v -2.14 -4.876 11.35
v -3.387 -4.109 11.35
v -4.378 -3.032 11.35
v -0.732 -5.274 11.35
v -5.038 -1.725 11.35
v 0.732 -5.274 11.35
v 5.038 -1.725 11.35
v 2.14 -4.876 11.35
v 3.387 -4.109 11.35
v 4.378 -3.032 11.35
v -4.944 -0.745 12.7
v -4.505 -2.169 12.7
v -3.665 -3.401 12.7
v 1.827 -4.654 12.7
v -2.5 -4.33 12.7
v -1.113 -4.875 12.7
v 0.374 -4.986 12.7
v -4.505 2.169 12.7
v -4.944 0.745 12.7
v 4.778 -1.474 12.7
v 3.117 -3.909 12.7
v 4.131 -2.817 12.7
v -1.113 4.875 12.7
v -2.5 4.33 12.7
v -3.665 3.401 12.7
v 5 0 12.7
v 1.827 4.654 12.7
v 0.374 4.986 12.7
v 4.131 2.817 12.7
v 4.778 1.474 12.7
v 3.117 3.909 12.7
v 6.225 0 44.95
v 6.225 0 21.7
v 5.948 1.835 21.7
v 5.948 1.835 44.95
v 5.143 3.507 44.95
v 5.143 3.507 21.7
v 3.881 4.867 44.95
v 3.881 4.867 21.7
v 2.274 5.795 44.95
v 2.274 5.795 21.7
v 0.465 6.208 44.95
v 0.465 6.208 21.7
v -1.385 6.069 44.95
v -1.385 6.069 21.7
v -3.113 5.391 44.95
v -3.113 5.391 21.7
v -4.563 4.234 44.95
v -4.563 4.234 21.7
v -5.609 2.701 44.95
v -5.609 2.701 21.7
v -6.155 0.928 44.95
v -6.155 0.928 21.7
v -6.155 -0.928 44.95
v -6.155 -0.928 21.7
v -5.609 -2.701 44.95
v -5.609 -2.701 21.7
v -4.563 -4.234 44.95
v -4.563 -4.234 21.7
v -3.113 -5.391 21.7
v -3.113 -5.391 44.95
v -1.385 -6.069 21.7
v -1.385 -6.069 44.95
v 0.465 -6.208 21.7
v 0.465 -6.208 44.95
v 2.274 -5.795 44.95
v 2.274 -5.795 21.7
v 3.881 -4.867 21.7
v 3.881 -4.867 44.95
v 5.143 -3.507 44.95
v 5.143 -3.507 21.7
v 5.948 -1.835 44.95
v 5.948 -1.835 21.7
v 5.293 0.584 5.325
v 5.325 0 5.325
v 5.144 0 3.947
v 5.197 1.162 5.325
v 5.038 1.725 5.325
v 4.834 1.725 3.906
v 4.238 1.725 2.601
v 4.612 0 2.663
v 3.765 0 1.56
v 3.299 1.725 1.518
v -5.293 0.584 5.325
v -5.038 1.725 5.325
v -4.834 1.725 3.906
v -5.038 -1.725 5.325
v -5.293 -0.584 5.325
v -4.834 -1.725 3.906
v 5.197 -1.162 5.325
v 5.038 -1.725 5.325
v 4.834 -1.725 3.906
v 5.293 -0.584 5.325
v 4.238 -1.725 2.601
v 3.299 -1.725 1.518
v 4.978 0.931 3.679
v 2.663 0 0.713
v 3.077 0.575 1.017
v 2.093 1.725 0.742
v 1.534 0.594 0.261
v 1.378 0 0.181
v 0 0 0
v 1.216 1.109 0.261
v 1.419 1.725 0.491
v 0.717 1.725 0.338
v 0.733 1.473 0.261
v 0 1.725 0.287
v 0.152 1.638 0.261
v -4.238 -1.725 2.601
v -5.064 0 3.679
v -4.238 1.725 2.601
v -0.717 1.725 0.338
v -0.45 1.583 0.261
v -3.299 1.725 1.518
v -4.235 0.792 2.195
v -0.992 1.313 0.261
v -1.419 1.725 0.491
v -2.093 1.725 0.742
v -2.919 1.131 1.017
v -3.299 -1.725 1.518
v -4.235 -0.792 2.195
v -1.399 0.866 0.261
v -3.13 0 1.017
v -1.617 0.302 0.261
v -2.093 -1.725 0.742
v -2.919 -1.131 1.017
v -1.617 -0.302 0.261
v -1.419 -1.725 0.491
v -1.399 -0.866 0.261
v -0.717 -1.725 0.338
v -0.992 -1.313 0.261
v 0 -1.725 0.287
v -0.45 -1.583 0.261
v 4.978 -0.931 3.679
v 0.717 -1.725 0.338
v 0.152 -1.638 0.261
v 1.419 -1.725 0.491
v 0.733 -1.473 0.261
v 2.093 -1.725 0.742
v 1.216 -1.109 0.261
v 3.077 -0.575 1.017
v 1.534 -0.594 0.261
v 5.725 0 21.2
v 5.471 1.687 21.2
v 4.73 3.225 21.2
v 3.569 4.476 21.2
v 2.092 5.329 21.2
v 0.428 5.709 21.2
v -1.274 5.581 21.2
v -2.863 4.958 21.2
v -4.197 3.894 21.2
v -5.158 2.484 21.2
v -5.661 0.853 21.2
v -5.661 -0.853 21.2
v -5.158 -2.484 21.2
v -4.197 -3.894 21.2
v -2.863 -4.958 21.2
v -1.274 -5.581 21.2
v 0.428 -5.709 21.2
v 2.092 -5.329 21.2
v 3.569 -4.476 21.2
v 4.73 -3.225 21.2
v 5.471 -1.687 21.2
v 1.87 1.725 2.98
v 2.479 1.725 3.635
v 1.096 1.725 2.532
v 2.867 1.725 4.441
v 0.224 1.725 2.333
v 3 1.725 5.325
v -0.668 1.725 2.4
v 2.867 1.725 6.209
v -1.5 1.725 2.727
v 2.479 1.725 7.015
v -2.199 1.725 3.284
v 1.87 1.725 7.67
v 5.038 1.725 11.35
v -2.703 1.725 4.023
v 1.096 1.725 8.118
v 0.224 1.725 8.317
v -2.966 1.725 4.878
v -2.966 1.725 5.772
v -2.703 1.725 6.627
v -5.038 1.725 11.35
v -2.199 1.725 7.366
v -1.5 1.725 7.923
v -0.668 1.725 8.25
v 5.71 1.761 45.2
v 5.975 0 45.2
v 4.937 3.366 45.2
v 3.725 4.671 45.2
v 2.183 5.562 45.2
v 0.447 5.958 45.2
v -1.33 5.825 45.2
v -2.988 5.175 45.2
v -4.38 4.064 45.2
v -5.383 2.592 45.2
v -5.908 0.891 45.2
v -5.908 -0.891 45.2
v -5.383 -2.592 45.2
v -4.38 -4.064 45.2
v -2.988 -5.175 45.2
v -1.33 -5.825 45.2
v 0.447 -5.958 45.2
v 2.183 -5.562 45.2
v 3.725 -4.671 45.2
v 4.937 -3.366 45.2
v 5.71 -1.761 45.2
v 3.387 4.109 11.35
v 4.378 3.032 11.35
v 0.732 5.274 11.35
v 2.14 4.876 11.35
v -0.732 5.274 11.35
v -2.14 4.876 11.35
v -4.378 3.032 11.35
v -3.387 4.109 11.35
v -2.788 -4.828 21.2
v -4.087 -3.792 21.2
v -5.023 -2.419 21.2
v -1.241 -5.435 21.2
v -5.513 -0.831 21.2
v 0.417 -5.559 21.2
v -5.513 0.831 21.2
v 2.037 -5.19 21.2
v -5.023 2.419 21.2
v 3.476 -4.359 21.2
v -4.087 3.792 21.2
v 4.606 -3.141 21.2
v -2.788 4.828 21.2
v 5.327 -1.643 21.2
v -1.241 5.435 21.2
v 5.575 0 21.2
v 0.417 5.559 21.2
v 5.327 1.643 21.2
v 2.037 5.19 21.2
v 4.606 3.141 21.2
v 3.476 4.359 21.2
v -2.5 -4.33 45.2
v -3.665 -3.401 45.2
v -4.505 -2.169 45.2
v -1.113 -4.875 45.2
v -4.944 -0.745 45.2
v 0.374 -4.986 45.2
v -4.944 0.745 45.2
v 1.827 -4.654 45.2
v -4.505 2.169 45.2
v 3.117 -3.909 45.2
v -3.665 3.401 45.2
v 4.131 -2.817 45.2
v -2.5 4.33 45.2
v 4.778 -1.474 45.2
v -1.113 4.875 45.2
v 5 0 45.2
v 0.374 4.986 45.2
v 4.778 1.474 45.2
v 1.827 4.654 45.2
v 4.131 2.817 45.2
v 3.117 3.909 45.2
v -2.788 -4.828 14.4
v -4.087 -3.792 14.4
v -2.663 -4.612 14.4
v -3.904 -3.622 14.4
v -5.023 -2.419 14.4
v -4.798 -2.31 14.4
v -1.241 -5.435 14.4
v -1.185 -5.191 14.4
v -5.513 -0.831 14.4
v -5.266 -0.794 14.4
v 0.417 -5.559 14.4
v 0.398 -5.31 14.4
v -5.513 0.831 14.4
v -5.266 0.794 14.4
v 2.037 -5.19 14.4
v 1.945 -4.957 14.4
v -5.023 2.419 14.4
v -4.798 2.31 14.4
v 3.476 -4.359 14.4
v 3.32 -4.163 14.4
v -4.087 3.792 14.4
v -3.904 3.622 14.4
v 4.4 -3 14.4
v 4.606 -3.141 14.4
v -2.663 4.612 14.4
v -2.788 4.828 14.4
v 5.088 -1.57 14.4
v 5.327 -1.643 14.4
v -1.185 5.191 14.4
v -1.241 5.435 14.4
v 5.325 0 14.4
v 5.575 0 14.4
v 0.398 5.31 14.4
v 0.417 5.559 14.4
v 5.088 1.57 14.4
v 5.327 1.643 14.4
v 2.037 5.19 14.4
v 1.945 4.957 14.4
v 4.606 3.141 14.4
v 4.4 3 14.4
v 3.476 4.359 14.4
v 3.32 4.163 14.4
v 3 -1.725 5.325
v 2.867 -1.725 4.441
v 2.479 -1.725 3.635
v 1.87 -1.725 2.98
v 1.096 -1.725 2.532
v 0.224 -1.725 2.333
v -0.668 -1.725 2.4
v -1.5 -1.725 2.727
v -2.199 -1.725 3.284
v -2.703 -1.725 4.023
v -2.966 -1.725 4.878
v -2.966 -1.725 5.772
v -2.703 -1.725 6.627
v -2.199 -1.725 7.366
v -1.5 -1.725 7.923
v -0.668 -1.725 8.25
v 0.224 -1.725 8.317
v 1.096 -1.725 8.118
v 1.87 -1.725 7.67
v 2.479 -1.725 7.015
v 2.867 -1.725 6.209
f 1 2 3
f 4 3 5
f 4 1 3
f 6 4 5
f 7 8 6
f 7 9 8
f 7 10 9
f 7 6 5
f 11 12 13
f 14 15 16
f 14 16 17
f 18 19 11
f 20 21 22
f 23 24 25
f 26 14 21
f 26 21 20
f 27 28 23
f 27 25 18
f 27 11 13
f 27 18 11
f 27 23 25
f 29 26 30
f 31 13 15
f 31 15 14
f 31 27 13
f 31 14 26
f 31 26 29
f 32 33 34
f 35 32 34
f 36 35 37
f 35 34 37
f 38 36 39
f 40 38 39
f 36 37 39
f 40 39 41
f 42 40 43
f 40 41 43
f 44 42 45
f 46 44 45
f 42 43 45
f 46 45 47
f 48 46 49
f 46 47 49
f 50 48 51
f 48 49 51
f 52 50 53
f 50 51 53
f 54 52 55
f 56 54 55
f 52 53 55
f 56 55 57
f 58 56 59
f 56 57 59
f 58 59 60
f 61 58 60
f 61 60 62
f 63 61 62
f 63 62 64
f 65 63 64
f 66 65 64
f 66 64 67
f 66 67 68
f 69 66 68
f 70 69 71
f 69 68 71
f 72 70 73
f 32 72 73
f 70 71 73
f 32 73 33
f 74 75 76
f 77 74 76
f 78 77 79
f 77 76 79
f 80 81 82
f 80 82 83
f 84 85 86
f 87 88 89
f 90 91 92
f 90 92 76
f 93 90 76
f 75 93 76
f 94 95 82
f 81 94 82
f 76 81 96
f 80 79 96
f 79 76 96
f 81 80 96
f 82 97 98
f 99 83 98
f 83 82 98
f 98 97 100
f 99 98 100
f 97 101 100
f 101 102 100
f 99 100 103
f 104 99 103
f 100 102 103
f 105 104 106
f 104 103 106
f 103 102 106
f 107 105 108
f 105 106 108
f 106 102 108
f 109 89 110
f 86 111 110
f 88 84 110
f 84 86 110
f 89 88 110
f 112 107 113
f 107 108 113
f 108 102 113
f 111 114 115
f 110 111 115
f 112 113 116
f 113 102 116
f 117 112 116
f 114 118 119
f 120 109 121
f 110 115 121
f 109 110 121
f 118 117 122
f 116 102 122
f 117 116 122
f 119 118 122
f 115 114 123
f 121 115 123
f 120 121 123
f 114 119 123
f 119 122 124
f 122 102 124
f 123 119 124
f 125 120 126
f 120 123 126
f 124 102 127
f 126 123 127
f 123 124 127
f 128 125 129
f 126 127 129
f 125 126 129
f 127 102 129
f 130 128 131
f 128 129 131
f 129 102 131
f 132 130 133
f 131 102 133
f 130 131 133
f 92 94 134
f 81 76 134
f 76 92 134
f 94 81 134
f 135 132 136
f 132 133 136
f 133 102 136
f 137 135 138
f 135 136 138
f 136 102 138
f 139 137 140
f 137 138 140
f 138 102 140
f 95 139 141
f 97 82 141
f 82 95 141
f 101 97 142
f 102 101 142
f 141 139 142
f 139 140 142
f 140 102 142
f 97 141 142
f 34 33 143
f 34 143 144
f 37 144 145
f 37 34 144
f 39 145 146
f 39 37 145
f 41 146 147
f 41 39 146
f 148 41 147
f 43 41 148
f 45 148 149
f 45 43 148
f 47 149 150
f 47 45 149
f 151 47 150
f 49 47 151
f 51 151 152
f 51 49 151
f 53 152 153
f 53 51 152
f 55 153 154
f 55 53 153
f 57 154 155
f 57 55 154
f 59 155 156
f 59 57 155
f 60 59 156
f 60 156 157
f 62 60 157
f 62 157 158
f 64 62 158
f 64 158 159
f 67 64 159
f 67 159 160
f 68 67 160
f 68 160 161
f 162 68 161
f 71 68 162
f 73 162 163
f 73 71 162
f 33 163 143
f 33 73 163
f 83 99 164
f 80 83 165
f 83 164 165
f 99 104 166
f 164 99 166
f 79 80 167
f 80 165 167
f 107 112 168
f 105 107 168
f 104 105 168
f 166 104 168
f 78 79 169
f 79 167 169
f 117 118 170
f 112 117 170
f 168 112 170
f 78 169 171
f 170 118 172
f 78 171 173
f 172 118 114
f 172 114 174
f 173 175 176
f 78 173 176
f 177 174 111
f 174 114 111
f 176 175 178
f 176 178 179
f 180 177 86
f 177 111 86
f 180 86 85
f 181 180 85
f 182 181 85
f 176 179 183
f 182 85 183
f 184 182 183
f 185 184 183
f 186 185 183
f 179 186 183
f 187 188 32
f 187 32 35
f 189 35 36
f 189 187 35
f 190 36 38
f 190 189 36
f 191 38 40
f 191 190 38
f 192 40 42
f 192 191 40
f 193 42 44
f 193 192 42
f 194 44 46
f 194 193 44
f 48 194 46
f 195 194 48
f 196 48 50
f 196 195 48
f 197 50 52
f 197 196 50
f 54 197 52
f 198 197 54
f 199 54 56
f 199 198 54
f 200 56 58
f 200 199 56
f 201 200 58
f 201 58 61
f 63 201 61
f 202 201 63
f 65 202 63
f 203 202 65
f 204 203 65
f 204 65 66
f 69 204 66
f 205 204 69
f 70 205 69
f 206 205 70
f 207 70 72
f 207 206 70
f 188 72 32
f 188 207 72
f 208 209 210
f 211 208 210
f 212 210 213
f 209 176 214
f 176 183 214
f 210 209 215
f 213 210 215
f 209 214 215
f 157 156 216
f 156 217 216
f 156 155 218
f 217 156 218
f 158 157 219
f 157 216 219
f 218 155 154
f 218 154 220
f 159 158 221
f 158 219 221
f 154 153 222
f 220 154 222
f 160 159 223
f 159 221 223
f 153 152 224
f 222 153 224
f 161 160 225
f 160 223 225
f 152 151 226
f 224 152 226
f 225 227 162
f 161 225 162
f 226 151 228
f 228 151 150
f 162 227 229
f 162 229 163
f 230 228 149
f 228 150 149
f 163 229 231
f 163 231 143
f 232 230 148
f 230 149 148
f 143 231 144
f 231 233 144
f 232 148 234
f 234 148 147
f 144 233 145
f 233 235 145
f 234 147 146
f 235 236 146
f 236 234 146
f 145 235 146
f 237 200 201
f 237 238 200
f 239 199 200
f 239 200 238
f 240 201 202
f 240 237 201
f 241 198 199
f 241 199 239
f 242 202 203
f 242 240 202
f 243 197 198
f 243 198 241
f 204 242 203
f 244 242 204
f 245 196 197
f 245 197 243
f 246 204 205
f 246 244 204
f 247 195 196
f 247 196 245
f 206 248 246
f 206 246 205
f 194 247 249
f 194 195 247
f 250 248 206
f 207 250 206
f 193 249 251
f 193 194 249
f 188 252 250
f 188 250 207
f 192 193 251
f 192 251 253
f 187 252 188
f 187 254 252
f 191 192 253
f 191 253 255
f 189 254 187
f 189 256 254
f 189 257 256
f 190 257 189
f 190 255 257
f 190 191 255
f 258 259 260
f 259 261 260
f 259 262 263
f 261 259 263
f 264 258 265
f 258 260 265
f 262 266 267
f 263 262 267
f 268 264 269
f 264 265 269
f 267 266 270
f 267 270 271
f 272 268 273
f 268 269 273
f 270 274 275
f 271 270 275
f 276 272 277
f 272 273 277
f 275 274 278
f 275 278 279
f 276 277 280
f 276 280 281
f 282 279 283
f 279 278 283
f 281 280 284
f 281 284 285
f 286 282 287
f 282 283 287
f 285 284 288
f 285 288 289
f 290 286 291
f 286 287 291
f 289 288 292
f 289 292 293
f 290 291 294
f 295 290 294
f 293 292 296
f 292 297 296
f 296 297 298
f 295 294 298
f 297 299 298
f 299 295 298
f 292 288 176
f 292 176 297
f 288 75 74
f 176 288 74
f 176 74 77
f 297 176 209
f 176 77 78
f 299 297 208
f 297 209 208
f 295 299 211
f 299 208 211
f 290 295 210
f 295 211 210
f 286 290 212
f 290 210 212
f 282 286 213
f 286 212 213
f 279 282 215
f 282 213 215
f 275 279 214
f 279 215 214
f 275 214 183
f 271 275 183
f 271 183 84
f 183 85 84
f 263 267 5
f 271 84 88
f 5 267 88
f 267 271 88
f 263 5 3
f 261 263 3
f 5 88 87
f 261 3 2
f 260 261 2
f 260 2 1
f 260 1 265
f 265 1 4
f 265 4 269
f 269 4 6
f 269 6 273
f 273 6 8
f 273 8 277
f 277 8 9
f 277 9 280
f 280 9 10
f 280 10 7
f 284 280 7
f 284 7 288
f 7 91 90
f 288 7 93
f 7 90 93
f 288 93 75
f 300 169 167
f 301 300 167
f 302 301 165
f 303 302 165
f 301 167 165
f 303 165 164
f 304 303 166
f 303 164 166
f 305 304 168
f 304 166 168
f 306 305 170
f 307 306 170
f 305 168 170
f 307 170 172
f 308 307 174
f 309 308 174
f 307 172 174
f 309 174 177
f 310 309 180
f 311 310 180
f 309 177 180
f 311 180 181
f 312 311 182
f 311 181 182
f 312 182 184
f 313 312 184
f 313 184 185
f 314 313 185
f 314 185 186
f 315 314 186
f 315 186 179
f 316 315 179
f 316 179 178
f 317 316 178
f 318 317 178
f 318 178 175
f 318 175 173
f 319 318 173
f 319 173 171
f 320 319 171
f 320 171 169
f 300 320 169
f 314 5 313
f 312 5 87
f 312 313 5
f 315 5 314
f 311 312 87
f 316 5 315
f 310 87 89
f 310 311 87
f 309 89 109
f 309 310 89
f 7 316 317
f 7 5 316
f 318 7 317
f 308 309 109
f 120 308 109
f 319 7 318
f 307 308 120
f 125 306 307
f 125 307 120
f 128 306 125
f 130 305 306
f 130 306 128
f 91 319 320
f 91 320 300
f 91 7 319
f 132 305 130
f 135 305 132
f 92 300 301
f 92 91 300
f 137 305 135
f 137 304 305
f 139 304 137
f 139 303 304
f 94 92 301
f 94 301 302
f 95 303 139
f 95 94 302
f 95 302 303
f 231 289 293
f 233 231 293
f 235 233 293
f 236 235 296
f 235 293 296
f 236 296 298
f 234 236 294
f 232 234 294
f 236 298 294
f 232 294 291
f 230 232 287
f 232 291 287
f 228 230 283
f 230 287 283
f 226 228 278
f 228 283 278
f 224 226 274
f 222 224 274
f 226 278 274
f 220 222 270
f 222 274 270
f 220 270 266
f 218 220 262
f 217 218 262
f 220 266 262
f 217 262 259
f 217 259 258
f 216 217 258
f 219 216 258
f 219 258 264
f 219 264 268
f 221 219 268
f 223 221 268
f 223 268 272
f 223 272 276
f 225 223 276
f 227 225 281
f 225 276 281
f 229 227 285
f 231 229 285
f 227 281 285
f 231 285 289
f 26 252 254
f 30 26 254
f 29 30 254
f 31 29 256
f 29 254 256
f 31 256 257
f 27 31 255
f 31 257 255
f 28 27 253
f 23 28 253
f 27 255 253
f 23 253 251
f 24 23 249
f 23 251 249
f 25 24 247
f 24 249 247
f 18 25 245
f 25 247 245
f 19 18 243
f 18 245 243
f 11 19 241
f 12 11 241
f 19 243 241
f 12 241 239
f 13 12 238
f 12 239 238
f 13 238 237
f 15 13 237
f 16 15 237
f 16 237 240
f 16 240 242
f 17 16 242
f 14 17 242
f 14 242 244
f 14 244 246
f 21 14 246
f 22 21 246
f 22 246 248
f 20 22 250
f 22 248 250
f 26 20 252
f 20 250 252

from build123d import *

# Parameters (mm, degrees)
SKETCH1_R               = 5.325
BOSS_EXTRUDE1_DEPTH     = 14.4
SKETCH2_R               = 5.575
BOSS_EXTRUDE2_DEPTH     = 6.8
SKETCH3_R               = 6.225
BOSS_EXTRUDE3_DEPTH     = 24
FILLET1_R               = 5.325
CUT_EXTRUDE1_DEPTH      = 48
CUT_EXTRUDE1_DEPTH_BACK = 48
SKETCH5_R               = 3
CUT_EXTRUDE2_DEPTH      = 48
CHAMFER1_SIZE           = 0.5
SKETCH6_R               = 5
CUT_EXTRUDE3_DEPTH      = 32.5
CHAMFER2_SIZE           = 0.25


with BuildPart() as part:
    # Sketch1 → Boss-Extrude1 (new body)
    with BuildSketch(Plane.XY):
        Circle(SKETCH1_R)
    extrude(amount=BOSS_EXTRUDE1_DEPTH)

    # Sketch2 → Boss-Extrude2 (add)
    with BuildSketch(Plane.XY.offset(14.4)):
        Circle(SKETCH2_R)
    extrude(amount=BOSS_EXTRUDE2_DEPTH)

    # Sketch3 → Boss-Extrude3 (add)
    with BuildSketch(Plane.XY.offset(21.2)):
        Circle(SKETCH3_R)
    extrude(amount=BOSS_EXTRUDE3_DEPTH)

    # Fillet1
    fillet1_edges = [part.edges().sort_by_distance(p)[0] for p in [
        (-5.325, 0, 0),
    ]]
    fillet(fillet1_edges, radius=FILLET1_R)

    # Sketch4 → Cut-Extrude1 (cut, two sides: drawn at the far end of the back side and taken through both)
    with BuildSketch(Plane(origin=(0, 0, 0), x_dir=(0, 0, -1), z_dir=(1, 0, 0)).offset(-CUT_EXTRUDE1_DEPTH_BACK)):
        Polygon((2.225204424, 1.725), (-11.35, 1.725), (-11.35, 16.315544117), (23.658725474, 16.315544117), (23.658725474, -14.317722388), (-11.35, -14.317722388), (-11.35, -1.725), (2.225204424, -1.725), align=None)
    extrude(amount=CUT_EXTRUDE1_DEPTH + CUT_EXTRUDE1_DEPTH_BACK, mode=Mode.SUBTRACT)

    # Sketch5 → Cut-Extrude2 (cut)
    with BuildSketch(Plane(origin=(0, 1.725, 0), x_dir=(1, 0, 0), z_dir=(0, 1, 0))):
        with Locations((0, -5.325)):
            Circle(SKETCH5_R)
    extrude(amount=-CUT_EXTRUDE2_DEPTH, mode=Mode.SUBTRACT)

    # Chamfer1
    chamfer1_edges = [part.edges().sort_by_distance(p)[0] for p in [
        (-6.225, 0, 21.2),
    ]]
    chamfer(chamfer1_edges, length=CHAMFER1_SIZE)

    # Sketch6 → Cut-Extrude3 (cut)
    with BuildSketch(Plane.XY.offset(45.2)):
        Circle(SKETCH6_R)
    extrude(amount=-CUT_EXTRUDE3_DEPTH, mode=Mode.SUBTRACT)

    # Chamfer2
    chamfer2_edges = [part.edges().sort_by_distance(p)[0] for p in [
        (-6.225, 0, 45.2),
    ]]
    chamfer(chamfer2_edges, length=CHAMFER2_SIZE)


solid = part.part
